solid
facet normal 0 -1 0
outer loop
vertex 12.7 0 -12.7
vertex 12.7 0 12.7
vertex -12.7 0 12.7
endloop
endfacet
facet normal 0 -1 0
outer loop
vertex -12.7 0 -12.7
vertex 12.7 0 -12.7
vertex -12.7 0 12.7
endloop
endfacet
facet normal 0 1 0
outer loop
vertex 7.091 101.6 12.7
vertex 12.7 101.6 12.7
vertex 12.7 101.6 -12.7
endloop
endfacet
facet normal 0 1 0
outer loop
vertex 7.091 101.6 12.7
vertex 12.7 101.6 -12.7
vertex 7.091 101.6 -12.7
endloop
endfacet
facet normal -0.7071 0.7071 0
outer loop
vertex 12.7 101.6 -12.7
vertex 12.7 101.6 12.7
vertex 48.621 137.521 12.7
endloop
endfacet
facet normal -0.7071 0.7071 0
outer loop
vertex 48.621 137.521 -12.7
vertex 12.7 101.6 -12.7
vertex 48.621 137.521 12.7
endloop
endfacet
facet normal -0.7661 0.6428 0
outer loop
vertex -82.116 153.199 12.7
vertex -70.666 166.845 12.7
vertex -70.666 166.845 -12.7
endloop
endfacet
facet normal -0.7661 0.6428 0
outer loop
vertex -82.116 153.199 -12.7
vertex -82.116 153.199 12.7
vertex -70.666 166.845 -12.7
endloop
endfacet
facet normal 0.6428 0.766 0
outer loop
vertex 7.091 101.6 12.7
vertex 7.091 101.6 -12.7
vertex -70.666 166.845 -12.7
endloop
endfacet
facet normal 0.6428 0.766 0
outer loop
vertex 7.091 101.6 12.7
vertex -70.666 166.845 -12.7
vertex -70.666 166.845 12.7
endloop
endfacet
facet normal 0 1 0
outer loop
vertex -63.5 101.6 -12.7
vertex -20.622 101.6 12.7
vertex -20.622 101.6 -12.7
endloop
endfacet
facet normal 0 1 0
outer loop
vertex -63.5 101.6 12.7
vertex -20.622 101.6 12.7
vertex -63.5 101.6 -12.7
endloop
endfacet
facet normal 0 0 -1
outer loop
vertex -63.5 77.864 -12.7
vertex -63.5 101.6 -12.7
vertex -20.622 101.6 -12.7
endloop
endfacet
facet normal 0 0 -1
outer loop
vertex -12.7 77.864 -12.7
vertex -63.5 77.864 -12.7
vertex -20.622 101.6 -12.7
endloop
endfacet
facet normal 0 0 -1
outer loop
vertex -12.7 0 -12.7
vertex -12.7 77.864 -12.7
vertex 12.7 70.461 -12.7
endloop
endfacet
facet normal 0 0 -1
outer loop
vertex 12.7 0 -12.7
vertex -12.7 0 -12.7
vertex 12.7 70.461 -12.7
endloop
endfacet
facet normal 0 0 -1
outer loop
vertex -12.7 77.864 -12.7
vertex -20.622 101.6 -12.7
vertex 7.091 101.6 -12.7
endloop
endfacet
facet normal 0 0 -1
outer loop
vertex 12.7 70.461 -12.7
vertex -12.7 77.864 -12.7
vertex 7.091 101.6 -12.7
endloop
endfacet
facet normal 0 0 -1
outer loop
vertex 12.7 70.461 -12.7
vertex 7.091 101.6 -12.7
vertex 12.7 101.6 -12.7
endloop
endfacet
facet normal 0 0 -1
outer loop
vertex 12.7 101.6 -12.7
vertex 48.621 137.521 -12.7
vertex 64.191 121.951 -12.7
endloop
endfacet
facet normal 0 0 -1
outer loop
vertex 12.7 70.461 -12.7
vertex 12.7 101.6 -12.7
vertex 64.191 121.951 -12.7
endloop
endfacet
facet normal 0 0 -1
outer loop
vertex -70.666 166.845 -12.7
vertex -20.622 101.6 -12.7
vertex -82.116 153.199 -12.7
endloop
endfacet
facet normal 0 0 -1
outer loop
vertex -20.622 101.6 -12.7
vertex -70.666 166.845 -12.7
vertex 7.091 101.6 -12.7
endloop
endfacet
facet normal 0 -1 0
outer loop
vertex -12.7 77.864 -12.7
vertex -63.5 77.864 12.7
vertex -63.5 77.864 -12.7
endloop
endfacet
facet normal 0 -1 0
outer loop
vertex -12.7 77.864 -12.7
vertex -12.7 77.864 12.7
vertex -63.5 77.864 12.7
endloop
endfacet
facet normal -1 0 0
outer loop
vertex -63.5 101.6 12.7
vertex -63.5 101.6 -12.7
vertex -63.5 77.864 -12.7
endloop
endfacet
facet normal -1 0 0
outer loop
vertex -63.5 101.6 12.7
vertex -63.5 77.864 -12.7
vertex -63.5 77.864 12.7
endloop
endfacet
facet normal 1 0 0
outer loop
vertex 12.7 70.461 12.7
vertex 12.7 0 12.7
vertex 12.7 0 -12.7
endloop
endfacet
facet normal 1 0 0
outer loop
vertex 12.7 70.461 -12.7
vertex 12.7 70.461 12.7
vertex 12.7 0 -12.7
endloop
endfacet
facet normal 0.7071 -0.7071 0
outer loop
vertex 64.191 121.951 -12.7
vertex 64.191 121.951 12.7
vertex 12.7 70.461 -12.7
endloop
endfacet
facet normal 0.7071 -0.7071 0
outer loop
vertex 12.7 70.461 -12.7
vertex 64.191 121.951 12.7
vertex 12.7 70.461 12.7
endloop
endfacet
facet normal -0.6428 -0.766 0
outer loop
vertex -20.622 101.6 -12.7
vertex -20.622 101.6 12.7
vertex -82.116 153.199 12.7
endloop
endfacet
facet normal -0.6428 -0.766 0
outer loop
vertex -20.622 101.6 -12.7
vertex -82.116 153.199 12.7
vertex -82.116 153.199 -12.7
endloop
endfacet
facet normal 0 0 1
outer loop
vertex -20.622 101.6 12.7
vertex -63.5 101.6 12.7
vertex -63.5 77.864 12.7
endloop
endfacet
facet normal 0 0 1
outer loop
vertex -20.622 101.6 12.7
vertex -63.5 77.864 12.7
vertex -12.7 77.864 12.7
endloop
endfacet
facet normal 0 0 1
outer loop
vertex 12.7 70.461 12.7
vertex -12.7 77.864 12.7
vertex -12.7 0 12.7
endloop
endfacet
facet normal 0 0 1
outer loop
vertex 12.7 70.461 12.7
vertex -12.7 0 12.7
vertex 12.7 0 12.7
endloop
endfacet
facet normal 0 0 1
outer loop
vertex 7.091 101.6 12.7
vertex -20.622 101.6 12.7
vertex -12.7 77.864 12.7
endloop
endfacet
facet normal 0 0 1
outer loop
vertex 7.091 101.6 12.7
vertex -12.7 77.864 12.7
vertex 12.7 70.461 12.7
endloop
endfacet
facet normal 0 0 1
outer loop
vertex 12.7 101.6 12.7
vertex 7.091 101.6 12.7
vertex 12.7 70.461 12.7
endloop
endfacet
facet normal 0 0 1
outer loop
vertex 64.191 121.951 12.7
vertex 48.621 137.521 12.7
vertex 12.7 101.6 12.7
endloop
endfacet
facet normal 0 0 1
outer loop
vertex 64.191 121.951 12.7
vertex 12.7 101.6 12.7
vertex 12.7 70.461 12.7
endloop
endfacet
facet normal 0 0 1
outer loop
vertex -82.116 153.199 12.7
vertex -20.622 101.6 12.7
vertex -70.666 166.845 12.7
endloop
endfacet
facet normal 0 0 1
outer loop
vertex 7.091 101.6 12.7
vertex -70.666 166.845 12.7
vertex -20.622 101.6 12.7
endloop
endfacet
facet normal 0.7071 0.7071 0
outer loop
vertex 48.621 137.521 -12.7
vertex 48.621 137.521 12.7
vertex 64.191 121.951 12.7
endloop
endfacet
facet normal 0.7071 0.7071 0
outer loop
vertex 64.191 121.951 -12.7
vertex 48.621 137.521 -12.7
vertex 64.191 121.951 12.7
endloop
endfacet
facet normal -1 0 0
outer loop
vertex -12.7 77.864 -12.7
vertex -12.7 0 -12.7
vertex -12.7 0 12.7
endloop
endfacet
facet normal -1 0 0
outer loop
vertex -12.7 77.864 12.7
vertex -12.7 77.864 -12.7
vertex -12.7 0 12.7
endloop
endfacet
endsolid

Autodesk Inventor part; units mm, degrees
ref_plane "XZ Plane" through (0, 0, 0) normal (0, 1, 0) x (-1, 0, 0)
ref_plane "XY Plane" through (0, 0, 0) normal (0, 0, 1) x (1, 0, 0)
sketch "Sketch1" plane through (0, 0, 0) normal (0, 1, 0) x (-1, 0, 0)
  line L0 (-12.7, 12.7) -> (-12.7, -12.7)
  line L1 (-12.7, -12.7) -> (12.7, -12.7)
  line L2 (12.7, -12.7) -> (12.7, 12.7)
  line L3 (12.7, 12.7) -> (-12.7, 12.7)
  line L4 (-12.7, 12.7) -> (12.7, -12.7) construction
  line L5 (-12.7, -12.7) -> (12.7, 12.7) construction
  point P0 (0, 0)
  dimension "d0" = 25.4
extrude "Extrusion1" add sketch "Sketch1" along normal blind 101.6
sketch "Sketch3" plane through (-12.7, 0, -12.7) normal (-1, 0, 0) x (0, 0, 1)
  line L0 (25.4, 101.6) -> (0, 101.6) projected
  line L1 (0, 101.6) -> (25.4, 101.6)
  line L2 (25.4, 101.6) -> (25.4, 77.8642)
  line L3 (25.4, 77.8642) -> (0, 77.8642)
  line L4 (0, 77.8642) -> (0, 101.6)
  point P0 (12.7, 0)
extrude "Extrusion3" add sketch "Sketch3" along normal blind 50.8
sketch "Sketch4" plane through (-12.7, 0, 12.7) normal (0, 0, 1) x (1, 0, 0)
  line L0 (25.4, 0) -> (25.4, 101.6) projected
  line L1 (25.4, 101.6) -> (61.321, 137.521)
  line L2 (25.4, 101.6) -> (76.2, 101.6) construction
  line L3 (61.321, 137.521) -> (76.8907, 121.9514)
  line L4 (76.8907, 121.9514) -> (25.4, 70.4607)
  point P0 (12.7, 0)
  dimension "d7" = 50.8
  dimension "d8" = 45
extrude "Extrusion4" add sketch "Sketch4" against normal blind 25.4
ref_plane "Work Plane2" through (-12.7, 77.8642, -12.7) normal (0.766, -0.6428, 0) x (0, 0, -1)
sketch "Sketch6" plane through (-12.7, 77.8642, -12.7) normal (0.766, -0.6428, 0) x (0, 0, -1)
  line L0 (0, 83.1971) -> (0, 10.6554) projected
  line L1 (-25.4, 10.6554) -> (-25.4, 83.1971) projected
  line L2 (0, 30.9038) -> (-25.4, 30.9038)
  line L3 (-25.4, 30.9038) -> (-25.4, 13.0904)
  line L4 (-25.4, 13.0904) -> (0, 13.0904)
  line L5 (0, 13.0904) -> (0, 30.9038)
  point P0 (-12.7, -51.4841)
  point P1 (0, 13.0904)
  point P2 (-25.4, 30.9038)
extrude "Extrusion6" add sketch "Sketch6" against normal blind 101.6
sketch "Sketch7" plane through (-12.7, 77.8642, -12.7) normal (0.766, -0.6428, 0) x (0, 0, -1)
  point P0 (-12.7, -51.4841)
properties part number "example01"
